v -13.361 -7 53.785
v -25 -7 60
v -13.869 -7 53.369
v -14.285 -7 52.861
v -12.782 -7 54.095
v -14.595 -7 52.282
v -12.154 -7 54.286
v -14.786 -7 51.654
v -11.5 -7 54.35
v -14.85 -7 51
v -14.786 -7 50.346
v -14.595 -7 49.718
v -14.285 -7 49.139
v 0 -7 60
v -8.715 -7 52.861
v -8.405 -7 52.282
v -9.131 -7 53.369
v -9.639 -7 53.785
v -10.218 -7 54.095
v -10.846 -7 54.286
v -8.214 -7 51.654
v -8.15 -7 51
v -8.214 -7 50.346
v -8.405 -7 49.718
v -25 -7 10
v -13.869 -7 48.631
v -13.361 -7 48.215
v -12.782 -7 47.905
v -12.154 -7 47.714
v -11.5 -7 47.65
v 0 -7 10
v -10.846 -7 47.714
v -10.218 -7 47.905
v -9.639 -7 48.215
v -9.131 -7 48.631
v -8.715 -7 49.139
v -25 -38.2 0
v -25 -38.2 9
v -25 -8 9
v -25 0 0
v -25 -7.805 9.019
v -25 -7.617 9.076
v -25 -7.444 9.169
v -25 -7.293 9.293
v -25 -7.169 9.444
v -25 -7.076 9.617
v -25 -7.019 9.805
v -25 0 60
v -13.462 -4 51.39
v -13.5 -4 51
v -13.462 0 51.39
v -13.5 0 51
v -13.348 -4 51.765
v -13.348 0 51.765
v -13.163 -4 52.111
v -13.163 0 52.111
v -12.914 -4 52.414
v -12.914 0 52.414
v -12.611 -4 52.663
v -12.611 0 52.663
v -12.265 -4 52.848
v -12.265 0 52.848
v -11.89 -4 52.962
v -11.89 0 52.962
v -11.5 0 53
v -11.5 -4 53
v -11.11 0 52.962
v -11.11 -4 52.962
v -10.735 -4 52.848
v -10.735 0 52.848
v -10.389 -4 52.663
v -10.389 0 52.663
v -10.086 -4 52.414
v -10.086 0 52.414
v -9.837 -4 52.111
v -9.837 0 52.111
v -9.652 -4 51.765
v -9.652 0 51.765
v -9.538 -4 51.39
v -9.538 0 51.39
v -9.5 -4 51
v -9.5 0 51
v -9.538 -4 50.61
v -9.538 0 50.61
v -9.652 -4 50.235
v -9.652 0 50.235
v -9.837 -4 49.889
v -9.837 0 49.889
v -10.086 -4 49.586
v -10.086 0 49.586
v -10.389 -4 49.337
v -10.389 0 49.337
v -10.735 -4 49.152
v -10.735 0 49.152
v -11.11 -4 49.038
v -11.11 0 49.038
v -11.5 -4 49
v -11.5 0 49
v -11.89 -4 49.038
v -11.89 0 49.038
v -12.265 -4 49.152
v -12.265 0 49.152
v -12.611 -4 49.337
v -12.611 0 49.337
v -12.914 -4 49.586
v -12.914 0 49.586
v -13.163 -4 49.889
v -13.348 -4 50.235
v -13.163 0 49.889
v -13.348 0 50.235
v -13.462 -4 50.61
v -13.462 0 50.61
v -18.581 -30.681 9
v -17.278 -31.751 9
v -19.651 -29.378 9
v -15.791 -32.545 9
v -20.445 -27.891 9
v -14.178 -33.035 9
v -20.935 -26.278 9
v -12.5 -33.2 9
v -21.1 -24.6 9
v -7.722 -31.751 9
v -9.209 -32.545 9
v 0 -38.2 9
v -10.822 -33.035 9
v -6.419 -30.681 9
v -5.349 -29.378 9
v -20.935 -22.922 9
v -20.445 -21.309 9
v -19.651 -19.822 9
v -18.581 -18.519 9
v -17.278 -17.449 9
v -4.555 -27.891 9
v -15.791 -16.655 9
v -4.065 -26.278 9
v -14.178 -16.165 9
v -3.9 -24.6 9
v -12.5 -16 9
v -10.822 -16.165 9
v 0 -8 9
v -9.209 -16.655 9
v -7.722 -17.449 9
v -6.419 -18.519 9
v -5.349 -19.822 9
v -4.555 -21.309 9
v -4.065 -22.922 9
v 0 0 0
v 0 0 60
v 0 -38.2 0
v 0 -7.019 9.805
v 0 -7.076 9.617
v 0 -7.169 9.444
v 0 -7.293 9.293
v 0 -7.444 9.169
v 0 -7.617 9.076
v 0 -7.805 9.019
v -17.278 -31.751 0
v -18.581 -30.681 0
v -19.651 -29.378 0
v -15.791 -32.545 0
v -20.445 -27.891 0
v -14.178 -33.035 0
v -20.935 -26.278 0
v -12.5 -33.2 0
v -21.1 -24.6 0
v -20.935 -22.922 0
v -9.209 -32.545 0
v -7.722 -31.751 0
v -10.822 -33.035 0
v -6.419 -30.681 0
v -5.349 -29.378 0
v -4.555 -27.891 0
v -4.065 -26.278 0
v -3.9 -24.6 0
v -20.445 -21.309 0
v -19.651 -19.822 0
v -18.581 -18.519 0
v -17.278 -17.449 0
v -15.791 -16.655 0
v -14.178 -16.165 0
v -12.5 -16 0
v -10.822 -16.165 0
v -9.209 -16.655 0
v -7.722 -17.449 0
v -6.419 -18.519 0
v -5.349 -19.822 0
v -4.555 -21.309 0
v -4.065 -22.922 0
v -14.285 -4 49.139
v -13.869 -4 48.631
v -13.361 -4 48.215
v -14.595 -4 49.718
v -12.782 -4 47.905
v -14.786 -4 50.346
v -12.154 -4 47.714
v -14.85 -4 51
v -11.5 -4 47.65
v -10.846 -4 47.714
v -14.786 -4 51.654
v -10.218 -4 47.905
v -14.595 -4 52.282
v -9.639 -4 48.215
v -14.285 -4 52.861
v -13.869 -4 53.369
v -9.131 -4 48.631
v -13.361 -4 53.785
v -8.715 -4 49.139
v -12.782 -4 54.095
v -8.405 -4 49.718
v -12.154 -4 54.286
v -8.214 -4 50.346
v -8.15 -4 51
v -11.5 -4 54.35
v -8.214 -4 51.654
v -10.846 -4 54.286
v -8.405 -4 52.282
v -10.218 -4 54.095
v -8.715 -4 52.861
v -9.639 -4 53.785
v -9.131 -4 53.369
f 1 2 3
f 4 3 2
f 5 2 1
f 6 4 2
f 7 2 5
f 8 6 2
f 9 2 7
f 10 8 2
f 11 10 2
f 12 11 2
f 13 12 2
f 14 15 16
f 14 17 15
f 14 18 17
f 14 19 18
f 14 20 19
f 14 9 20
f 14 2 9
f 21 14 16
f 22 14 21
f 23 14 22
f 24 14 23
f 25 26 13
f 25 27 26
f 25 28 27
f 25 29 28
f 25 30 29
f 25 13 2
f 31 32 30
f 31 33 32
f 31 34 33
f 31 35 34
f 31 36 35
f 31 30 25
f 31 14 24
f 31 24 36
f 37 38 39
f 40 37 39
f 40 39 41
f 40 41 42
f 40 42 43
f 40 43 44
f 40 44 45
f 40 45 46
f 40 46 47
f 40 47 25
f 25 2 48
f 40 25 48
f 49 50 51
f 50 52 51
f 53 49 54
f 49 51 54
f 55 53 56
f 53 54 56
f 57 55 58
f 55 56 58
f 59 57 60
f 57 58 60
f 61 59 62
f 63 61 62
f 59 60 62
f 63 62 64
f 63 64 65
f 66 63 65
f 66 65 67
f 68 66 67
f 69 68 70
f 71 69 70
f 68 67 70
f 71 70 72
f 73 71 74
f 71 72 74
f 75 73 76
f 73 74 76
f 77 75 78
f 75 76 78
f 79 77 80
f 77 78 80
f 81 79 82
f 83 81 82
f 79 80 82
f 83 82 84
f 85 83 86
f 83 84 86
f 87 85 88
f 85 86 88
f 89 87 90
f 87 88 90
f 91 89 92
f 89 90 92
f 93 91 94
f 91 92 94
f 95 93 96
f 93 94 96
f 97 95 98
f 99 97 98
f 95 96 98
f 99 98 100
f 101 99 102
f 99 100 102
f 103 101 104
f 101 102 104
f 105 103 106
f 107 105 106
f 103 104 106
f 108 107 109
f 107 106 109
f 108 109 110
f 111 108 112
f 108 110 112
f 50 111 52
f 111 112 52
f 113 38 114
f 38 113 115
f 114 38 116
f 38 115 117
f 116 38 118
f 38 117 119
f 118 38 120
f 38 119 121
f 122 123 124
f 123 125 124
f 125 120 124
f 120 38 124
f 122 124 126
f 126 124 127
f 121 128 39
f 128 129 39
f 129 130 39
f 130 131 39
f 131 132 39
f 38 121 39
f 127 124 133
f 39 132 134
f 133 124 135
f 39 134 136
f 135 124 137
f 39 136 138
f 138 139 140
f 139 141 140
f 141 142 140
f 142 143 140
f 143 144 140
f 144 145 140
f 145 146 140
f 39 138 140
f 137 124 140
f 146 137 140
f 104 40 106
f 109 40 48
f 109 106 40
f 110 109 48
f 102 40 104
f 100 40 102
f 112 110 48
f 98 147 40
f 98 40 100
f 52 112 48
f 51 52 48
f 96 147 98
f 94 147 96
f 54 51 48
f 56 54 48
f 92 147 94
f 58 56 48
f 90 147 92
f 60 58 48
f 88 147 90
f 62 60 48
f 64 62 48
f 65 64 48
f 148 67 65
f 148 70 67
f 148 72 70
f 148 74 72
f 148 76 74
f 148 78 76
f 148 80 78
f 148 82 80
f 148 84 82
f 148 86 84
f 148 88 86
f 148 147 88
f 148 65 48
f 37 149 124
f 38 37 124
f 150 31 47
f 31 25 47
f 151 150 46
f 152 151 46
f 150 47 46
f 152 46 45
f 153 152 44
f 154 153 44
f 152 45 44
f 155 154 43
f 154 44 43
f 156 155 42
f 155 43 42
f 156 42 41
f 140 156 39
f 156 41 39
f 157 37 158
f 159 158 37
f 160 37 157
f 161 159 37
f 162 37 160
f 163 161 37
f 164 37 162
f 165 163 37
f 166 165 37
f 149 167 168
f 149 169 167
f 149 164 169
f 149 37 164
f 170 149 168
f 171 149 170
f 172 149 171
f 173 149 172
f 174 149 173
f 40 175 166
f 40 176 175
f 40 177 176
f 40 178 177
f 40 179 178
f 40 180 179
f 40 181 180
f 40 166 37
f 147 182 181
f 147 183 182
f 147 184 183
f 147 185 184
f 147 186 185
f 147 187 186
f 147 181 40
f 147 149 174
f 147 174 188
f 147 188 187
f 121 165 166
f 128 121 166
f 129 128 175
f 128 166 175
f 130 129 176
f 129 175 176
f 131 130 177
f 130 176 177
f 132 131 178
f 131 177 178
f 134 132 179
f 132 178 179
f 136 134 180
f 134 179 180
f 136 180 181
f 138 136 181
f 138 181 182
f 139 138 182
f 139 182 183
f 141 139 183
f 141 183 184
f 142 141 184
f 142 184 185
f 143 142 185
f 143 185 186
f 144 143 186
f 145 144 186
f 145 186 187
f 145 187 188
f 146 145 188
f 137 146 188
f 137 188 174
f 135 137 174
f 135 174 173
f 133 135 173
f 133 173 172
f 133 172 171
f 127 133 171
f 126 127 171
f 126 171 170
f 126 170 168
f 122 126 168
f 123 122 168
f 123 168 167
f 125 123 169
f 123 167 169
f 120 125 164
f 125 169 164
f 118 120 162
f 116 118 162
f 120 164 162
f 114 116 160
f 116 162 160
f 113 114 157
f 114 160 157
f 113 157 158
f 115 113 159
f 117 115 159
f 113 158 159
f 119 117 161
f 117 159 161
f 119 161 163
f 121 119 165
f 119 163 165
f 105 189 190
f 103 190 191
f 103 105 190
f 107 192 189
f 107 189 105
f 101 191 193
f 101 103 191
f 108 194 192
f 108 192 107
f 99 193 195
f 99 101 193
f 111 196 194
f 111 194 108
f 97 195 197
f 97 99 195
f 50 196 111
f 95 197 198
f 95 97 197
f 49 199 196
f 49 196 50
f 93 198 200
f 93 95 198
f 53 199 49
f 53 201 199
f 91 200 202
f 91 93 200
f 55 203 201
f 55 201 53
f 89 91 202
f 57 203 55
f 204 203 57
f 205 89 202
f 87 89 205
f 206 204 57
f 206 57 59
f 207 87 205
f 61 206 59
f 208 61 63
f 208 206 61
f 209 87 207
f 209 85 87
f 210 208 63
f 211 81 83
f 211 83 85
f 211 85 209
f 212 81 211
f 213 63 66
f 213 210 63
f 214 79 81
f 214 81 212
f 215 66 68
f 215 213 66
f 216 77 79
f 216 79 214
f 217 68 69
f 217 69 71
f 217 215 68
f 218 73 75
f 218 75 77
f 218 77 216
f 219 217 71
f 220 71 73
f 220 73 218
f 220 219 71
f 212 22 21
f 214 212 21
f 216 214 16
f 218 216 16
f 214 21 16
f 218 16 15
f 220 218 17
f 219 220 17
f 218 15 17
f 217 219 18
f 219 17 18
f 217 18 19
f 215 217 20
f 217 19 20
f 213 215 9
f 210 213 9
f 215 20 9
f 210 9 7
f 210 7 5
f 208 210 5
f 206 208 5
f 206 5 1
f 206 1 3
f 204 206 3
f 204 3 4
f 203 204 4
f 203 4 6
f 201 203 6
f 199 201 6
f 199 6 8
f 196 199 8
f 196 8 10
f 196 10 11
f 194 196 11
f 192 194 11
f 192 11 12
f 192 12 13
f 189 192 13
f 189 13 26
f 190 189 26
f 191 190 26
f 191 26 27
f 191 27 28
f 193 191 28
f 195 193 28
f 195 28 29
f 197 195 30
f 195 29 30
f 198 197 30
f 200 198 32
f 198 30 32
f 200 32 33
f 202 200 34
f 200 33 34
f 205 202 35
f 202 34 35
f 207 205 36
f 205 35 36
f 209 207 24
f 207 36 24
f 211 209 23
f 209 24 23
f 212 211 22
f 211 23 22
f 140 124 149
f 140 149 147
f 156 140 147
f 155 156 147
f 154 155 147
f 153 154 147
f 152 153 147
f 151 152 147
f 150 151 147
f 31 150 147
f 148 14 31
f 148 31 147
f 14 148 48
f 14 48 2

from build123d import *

# Parameters (mm, degrees)
F0_W           = 31.2
F0_H           = 9
F1_DEPTH       = 25
F3_D           = 17.2
F5_D           = 4
F5_CBORE_D     = 6.7
F5_CBORE_DEPTH = 3
F6_R           = 1


with BuildPart() as f1:
    # F0 (on Right) → F1 (new body)
    with BuildSketch(Plane.YZ):
        Polygon((-7, 0), (0, 0), (0, 60), (-7, 60), (-7, 9), align=None)
        with Locations((-22.6, 4.5)):
            Rectangle(F0_W, F0_H)
    extrude(amount=-F1_DEPTH)

    # F3 (through all)
    with Locations(Plane.XY.offset(9)):
        with Locations((-12.5, -24.6)):
            Hole(F3_D / 2)

    # F5 (through all)
    with Locations(Plane.XZ.offset(7)):
        with Locations((-11.5, 51)):
            CounterBoreHole(F5_D / 2, F5_CBORE_D / 2, F5_CBORE_DEPTH)

    # F6
    f6_edges = [f1.edges().sort_by_distance(p)[0] for p in [
        (-12.5, -7, 9),
    ]]
    fillet(f6_edges, radius=F6_R)


solid = f1.part
